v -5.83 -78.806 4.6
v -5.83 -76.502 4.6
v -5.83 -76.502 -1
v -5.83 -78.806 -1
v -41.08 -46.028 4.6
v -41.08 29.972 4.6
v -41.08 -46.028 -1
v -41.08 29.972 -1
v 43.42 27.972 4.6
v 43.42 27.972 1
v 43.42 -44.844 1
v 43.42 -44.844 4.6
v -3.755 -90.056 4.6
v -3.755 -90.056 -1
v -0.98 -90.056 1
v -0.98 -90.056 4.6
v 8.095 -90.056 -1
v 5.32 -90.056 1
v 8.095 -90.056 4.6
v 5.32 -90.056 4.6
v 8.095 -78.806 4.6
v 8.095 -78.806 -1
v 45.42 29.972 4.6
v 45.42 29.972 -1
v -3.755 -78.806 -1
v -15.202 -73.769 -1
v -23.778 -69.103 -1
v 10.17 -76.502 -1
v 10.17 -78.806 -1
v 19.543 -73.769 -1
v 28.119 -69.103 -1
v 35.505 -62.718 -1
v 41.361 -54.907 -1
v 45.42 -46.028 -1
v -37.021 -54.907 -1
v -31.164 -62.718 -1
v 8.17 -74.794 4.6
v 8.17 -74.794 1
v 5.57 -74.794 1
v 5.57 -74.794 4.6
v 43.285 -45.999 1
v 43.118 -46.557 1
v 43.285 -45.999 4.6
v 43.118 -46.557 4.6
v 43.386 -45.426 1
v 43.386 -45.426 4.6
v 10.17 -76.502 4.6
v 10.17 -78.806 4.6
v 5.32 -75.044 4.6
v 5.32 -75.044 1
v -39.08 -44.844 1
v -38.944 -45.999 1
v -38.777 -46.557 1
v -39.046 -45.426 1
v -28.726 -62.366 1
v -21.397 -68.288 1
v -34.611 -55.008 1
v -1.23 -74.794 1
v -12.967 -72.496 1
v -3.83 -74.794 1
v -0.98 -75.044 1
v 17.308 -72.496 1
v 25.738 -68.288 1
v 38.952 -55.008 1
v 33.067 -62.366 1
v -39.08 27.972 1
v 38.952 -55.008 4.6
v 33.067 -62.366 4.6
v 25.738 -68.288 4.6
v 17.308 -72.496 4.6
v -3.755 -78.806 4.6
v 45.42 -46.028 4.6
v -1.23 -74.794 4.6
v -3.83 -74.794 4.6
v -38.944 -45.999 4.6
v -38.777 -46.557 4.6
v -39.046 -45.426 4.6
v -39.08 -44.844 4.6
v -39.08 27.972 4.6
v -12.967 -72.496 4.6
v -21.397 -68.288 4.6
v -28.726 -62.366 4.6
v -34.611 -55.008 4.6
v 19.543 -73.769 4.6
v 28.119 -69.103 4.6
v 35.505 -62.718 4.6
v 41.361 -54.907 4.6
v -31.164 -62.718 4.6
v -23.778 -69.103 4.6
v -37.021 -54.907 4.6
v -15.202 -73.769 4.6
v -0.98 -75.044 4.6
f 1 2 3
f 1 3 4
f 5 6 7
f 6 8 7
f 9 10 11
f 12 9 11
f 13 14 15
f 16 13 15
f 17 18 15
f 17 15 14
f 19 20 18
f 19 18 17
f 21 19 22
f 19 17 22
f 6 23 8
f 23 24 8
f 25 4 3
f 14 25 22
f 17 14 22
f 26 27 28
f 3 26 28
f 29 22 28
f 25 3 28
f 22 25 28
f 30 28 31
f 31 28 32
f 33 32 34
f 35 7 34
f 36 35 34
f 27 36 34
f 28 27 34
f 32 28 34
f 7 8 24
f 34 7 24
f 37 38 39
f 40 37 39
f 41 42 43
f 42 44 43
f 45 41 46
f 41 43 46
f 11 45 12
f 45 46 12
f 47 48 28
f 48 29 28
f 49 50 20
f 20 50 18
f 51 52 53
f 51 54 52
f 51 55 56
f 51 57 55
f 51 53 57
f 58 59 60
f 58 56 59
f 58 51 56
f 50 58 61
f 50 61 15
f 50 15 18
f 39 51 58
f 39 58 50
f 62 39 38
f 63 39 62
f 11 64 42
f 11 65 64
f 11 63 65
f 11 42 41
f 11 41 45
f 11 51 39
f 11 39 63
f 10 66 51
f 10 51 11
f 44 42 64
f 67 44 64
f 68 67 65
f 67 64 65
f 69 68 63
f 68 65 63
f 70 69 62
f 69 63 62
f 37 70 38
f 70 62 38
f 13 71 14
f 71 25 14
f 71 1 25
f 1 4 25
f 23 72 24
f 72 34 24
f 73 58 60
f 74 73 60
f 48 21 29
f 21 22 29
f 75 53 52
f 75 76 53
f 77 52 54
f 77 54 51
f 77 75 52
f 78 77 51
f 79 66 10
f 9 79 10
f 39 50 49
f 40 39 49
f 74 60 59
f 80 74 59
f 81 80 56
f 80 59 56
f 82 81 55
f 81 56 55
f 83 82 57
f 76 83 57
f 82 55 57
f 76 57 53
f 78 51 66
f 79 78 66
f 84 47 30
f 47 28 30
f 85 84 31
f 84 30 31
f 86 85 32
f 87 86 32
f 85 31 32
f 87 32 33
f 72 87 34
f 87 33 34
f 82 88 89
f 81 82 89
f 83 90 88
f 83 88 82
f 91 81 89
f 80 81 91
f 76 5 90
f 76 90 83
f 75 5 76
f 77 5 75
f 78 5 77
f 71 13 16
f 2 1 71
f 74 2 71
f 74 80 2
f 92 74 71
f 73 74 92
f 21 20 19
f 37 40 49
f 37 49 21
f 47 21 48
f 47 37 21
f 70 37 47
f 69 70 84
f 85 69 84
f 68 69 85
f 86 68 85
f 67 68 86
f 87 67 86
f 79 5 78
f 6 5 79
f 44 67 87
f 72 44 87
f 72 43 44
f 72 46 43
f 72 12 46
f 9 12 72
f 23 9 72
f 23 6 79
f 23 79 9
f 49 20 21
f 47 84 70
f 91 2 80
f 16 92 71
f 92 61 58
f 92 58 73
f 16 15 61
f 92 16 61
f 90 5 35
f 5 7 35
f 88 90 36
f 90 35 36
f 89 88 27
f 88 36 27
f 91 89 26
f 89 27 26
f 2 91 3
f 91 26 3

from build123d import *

# Parameters (mm, degrees)
F0_W     = 5.925
F0_H     = 11.25
F0_H_2   = 1.596662
F1_DEPTH = 1
F3_DEPTH = 3.6
F4_R     = 5
F5_SIZE  = 0.25


with BuildPart() as f1:
    # F0 (on Top) → F1 (new body, symmetric)
    with BuildSketch(Plane.XY):
        with BuildLine():
            Line((2.170431, -46.027672), (-38.966179, -46.027672))
            ThreePointArc((-38.966179, -46.027672), (-23.047559, -67.17303), (2.170431, -75.209299))
            Line((2.170431, -75.209299), (2.170431, -46.027672))
        make_face()
        with BuildLine():
            ThreePointArc((2.170431, -75.209299), (27.388422, -67.17303), (43.307042, -46.027672))
            Line((43.307042, -46.027672), (2.170431, -46.027672))
            Line((2.170431, -46.027672), (2.170431, -75.209299))
        make_face()
        with BuildLine():
            Line((45.420431, 29.972328), (-41.079569, 29.972328))
            Line((-41.079569, 29.972328), (-41.079569, -46.027672))
            Line((-41.079569, -46.027672), (-38.966179, -46.027672))
            ThreePointArc((-38.966179, -46.027672), (-39.0232, -45.863777), (-39.079569, -45.699656))
            Line((-39.079569, -45.699656), (-39.079569, 27.972328))
            Line((-39.079569, 27.972328), (43.420431, 27.972328))
            Line((43.420431, 27.972328), (43.420431, -45.699656))
            ThreePointArc((43.420431, -45.699656), (43.364063, -45.863777), (43.307042, -46.027672))
            Line((43.307042, -46.027672), (45.420431, -46.027672))
            Line((45.420431, -46.027672), (45.420431, 29.972328))
        make_face()
        with BuildLine():
            Line((-38.966179, -46.027672), (-41.079569, -46.027672))
            ThreePointArc((-41.079569, -46.027672), (-27.642472, -66.108974), (-5.829569, -76.501831))
            Line((-5.829569, -76.501831), (2.170431, -76.501831))
            Line((2.170431, -76.501831), (2.170431, -75.209299))
            ThreePointArc((2.170431, -75.209299), (-23.047559, -67.17303), (-38.966179, -46.027672))
        make_face()
        with BuildLine():
            ThreePointArc((10.170431, -76.501831), (31.983335, -66.108974), (45.420431, -46.027672))
            Line((45.420431, -46.027672), (43.307042, -46.027672))
            ThreePointArc((43.307042, -46.027672), (27.388422, -67.17303), (2.170431, -75.209299))
            Line((2.170431, -75.209299), (2.170431, -76.501831))
            Line((2.170431, -76.501831), (10.170431, -76.501831))
        make_face()
        with BuildLine():
            ThreePointArc((-39.079569, -45.699656), (-39.0232, -45.863777), (-38.966179, -46.027672))
            Line((-38.966179, -46.027672), (2.170431, -46.027672))
            Line((2.170431, -46.027672), (43.307042, -46.027672))
            ThreePointArc((43.307042, -46.027672), (43.364063, -45.863777), (43.420431, -45.699656))
            Line((43.420431, -45.699656), (43.420431, 27.972328))
            Line((43.420431, 27.972328), (-39.079569, 27.972328))
            Line((-39.079569, 27.972328), (-39.079569, -45.699656))
        make_face()
        with Locations((5.132931, -84.430961)):
            Rectangle(F0_W, F0_H)
        with Locations((-0.792069, -84.430961)):
            Rectangle(F0_W, F0_H)
        with Locations((-0.792069, -78.00763)):
            Rectangle(F0_W, F0_H_2)
        with BuildLine():
            ThreePointArc((2.170431, -77.209299), (-1.845179, -77.032088), (-5.829569, -76.501831))
            Line((-5.829569, -76.501831), (-5.829569, -78.805961))
            Line((-5.829569, -78.805961), (-3.754569, -78.805961))
            Line((-3.754569, -78.805961), (-3.754569, -77.209299))
            Line((-3.754569, -77.209299), (2.170431, -77.209299))
        make_face()
        with BuildLine():
            Line((10.170431, -78.805961), (10.170431, -76.501831))
            ThreePointArc((10.170431, -76.501831), (6.186042, -77.032088), (2.170431, -77.209299))
            Line((2.170431, -77.209299), (8.095431, -77.209299))
            Line((8.095431, -77.209299), (8.095431, -78.805961))
            Line((8.095431, -78.805961), (10.170431, -78.805961))
        make_face()
        with Locations((5.132931, -78.00763)):
            Rectangle(F0_W, F0_H_2)
        with BuildLine():
            Line((2.170431, -76.501831), (-5.829569, -76.501831))
            ThreePointArc((-5.829569, -76.501831), (-1.845179, -77.032088), (2.170431, -77.209299))
            Line((2.170431, -77.209299), (2.170431, -76.501831))
        make_face()
        with BuildLine():
            ThreePointArc((2.170431, -77.209299), (6.186042, -77.032088), (10.170431, -76.501831))
            Line((10.170431, -76.501831), (2.170431, -76.501831))
            Line((2.170431, -76.501831), (2.170431, -77.209299))
        make_face()
    extrude(amount=F1_DEPTH, both=True)

    # F2 (on face) → F3 (join)
    with BuildSketch(Plane.XY.offset(1)):
        with BuildLine():
            Line((-39.079569, 27.972328), (43.420431, 27.972328))
            Line((43.420431, 27.972328), (43.420431, -45.699656))
            ThreePointArc((43.420431, -45.699656), (29.915085, -65.238213), (8.170431, -74.794342))
            Line((8.170431, -74.794342), (8.170431, -76.805961))
            Line((8.170431, -76.805961), (6.095431, -76.805961))
            Line((6.095431, -76.805961), (6.095431, -88.055961))
            Line((6.095431, -88.055961), (5.320431, -88.055961))
            Line((5.320431, -88.055961), (5.320431, -90.055961))
            Line((5.320431, -90.055961), (8.095431, -90.055961))
            Line((8.095431, -90.055961), (8.095431, -78.805961))
            Line((8.095431, -78.805961), (10.170431, -78.805961))
            Line((10.170431, -78.805961), (10.170431, -76.501831))
            ThreePointArc((10.170431, -76.501831), (31.983335, -66.108974), (45.420431, -46.027672))
            Line((45.420431, -46.027672), (45.420431, 29.972328))
            Line((45.420431, 29.972328), (-41.079569, 29.972328))
            Line((-41.079569, 29.972328), (-41.079569, -46.027672))
            ThreePointArc((-41.079569, -46.027672), (-27.642472, -66.108974), (-5.829569, -76.501831))
            Line((-5.829569, -76.501831), (-5.829569, -78.805961))
            Line((-5.829569, -78.805961), (-3.754569, -78.805961))
            Line((-3.754569, -78.805961), (-3.754569, -90.055961))
            Line((-3.754569, -90.055961), (-0.979569, -90.055961))
            Line((-0.979569, -90.055961), (-0.979569, -88.055961))
            Line((-0.979569, -88.055961), (-1.754569, -88.055961))
            Line((-1.754569, -88.055961), (-1.754569, -76.805961))
            Line((-1.754569, -76.805961), (-3.829569, -76.805961))
            Line((-3.829569, -76.805961), (-3.829569, -74.794342))
            ThreePointArc((-3.829569, -74.794342), (-25.574222, -65.238213), (-39.079569, -45.699656))
            Line((-39.079569, -45.699656), (-39.079569, 27.972328))
        make_face()
        Polygon((-0.979569, -74.794342), (-3.829569, -74.794342), (-3.829569, -76.805961), (-1.754569, -76.805961), (-1.754569, -88.055961), (-0.979569, -88.055961), align=None)
        Polygon((8.170431, -76.805961), (8.170431, -74.794342), (5.320431, -74.794342), (5.320431, -88.055961), (6.095431, -88.055961), (6.095431, -76.805961), align=None)
    extrude(amount=F3_DEPTH)

    # F4
    f4_edges = [f1.edges().sort_by_distance(p)[0] for p in [
        (-39.079569, -45.699656, 2.8),
        (43.420431, -45.699656, 2.8),
    ]]
    fillet(f4_edges, radius=F4_R)

    # F5
    f5_edges = [f1.edges().sort_by_distance(p)[0] for p in [
        (-0.979569, -74.794342, 2.8),
        (5.320431, -74.794342, 2.8),
    ]]
    chamfer(f5_edges, length=F5_SIZE)


solid = f1.part
